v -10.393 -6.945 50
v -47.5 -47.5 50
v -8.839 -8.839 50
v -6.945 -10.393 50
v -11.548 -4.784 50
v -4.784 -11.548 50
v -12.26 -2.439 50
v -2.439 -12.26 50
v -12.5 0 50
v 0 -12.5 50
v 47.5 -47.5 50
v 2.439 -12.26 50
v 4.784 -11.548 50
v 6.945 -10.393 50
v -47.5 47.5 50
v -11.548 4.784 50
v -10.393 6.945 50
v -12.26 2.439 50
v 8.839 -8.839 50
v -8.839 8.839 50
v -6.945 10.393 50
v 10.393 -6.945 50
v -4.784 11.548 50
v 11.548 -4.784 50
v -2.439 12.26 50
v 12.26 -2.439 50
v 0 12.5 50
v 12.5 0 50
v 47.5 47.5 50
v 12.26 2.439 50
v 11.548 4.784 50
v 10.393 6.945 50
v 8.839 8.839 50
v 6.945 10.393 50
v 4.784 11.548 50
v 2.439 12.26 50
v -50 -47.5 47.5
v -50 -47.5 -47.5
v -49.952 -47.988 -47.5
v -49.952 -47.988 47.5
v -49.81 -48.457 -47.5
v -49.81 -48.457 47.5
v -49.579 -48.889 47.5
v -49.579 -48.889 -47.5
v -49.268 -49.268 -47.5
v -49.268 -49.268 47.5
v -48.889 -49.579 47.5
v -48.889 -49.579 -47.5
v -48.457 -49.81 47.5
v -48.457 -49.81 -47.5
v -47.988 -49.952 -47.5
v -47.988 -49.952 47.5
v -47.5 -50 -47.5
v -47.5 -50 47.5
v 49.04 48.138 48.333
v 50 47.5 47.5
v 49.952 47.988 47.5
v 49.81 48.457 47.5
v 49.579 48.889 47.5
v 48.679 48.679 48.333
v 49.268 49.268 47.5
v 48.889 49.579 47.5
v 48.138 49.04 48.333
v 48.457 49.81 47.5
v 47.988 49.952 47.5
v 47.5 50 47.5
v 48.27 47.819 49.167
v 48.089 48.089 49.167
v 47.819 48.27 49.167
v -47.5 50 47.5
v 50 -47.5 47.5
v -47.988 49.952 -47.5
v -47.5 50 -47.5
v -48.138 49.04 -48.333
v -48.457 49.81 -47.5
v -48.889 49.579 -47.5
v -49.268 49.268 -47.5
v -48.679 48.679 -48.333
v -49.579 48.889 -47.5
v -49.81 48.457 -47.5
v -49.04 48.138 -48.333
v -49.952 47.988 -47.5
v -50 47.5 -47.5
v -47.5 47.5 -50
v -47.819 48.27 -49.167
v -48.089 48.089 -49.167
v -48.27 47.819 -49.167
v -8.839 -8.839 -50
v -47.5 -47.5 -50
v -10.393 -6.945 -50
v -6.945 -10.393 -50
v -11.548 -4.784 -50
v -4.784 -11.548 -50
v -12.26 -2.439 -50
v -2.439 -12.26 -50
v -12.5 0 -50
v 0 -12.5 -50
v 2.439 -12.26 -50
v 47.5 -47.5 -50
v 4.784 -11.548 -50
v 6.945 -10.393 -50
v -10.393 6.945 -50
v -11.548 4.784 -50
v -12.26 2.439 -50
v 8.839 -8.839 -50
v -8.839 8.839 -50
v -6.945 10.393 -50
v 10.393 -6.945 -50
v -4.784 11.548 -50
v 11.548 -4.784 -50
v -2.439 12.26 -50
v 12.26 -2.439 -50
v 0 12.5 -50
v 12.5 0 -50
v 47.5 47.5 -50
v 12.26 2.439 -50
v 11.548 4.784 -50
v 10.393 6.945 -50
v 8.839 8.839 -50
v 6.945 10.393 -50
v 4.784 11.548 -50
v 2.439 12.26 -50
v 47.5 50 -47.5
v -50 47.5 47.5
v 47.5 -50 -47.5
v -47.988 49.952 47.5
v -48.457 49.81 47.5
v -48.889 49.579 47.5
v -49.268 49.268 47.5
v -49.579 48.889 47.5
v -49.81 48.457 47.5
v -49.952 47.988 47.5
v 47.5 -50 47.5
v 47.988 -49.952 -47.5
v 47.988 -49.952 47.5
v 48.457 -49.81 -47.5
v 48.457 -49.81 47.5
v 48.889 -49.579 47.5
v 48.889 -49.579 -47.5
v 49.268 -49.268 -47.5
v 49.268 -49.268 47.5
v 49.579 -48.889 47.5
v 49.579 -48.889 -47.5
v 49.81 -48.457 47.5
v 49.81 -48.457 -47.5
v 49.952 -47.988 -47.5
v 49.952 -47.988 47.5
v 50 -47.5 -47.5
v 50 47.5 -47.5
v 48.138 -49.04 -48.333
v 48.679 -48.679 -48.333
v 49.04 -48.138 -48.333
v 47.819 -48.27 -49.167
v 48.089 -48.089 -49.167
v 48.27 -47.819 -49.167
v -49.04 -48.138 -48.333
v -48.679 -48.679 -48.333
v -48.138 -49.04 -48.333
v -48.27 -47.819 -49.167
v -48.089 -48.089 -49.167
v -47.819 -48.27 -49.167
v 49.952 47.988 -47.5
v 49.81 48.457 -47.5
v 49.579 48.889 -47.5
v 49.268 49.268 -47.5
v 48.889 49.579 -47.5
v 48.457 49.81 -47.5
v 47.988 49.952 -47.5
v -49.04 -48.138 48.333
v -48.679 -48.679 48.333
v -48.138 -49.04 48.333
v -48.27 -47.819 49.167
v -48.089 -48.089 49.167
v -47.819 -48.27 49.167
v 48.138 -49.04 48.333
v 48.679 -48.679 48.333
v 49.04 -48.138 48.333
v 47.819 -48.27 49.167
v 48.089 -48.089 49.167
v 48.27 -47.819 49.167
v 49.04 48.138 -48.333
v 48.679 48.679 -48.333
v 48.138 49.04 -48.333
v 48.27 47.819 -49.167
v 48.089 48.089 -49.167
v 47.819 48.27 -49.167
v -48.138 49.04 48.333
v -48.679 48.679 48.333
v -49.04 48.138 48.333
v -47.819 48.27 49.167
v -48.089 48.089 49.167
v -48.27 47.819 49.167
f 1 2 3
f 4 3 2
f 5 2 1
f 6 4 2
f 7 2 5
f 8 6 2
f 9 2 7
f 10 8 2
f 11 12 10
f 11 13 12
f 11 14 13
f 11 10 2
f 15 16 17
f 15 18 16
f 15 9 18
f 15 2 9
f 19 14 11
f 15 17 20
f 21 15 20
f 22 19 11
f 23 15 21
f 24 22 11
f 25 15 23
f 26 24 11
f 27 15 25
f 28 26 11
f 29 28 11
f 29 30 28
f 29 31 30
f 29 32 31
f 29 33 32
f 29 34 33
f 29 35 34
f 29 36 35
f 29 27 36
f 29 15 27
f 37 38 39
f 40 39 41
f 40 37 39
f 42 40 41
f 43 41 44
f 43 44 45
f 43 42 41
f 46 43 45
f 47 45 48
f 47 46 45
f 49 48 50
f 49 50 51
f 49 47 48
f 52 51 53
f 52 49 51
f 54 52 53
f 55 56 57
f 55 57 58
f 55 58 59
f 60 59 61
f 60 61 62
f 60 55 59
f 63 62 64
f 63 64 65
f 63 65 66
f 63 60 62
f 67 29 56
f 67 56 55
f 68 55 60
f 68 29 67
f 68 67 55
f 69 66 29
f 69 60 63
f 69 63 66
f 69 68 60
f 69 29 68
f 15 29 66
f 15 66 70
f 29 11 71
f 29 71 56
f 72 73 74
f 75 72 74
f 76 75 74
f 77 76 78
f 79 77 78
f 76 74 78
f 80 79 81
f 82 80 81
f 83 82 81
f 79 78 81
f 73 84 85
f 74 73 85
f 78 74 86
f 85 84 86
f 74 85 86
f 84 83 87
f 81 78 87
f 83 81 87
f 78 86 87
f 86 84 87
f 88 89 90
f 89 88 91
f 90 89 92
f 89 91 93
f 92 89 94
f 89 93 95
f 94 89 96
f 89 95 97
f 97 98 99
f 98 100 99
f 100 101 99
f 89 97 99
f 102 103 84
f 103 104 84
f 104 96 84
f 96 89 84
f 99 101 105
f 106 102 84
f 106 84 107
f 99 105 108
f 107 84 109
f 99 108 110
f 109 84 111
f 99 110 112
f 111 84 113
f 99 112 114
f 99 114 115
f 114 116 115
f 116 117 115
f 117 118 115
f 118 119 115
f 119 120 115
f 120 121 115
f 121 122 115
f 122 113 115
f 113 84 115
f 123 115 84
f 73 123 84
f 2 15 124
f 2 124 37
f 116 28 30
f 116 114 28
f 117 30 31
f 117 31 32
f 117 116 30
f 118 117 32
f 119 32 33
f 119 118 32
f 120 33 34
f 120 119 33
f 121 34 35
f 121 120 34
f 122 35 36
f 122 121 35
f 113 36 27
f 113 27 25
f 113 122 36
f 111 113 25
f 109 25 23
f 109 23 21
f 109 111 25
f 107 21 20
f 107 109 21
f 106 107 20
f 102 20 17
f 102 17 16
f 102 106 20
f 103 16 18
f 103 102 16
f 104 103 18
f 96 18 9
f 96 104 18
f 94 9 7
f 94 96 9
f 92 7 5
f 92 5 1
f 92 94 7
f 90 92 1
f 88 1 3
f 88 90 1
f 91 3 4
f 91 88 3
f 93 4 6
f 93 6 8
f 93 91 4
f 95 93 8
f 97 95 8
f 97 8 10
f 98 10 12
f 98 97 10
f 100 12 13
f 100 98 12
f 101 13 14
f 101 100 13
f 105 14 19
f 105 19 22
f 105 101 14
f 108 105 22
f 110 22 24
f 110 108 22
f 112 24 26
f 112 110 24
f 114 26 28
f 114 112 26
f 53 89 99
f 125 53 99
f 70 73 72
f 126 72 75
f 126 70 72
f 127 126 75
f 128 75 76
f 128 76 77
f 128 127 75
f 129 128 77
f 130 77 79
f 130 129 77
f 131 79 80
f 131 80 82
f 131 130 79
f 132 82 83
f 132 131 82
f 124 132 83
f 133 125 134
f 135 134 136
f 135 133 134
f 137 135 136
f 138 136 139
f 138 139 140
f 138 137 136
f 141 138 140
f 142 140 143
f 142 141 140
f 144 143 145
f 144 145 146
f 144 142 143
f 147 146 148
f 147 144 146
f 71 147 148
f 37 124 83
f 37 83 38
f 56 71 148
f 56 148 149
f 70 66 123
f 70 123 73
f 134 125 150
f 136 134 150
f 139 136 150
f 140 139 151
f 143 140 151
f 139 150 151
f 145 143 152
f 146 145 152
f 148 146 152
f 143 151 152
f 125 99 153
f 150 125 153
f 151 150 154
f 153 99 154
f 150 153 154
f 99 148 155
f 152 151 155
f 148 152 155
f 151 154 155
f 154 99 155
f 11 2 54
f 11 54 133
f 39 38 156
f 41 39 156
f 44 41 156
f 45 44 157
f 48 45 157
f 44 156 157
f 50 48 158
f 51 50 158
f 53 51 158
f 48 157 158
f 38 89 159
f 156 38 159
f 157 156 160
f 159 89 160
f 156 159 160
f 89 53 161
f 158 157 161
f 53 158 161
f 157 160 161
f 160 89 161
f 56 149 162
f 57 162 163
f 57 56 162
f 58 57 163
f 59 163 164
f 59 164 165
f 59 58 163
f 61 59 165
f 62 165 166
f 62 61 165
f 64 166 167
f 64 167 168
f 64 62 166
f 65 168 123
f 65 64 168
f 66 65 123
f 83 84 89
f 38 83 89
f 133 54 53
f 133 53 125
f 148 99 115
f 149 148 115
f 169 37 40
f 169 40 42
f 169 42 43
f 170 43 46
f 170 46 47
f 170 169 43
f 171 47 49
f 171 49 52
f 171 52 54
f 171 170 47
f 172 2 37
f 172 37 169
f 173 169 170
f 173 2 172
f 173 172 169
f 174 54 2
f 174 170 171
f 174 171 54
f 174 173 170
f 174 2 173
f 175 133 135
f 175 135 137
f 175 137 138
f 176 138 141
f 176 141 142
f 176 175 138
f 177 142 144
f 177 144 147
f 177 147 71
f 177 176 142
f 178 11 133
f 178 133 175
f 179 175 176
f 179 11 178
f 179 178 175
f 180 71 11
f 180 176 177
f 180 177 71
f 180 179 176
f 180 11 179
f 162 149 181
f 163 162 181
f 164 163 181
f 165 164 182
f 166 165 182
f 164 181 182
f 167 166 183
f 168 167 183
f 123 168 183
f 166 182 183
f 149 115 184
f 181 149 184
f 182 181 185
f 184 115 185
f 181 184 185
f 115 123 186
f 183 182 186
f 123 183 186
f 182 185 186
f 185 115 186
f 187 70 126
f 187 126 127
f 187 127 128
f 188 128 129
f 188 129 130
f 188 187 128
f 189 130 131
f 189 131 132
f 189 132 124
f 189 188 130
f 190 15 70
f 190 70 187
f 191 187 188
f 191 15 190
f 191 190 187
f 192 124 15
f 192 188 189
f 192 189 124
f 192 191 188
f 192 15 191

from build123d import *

# Parameters (mm, degrees)
F0_R     = 12.5
F1_DEPTH = 50
F2_SIZE  = 2.49999


# Not quite as in the source:
# - a fillet or chamfer is up to 0.001 mm smaller than in the source, because OpenCascade refuses the exact size


with BuildPart() as f1:
    # F0 (on Top) → F1 (new body, symmetric)
    with BuildSketch(Plane.XY):
        with BuildLine():
            ThreePointArc((-50, -47.5), (-49.267766953, -49.267766953), (-47.5, -50))
            Line((-47.5, -50), (47.5, -50))
            ThreePointArc((47.5, -50), (49.267766953, -49.267766953), (50, -47.5))
            Line((50, -47.5), (50, 47.5))
            ThreePointArc((50, 47.5), (49.267766953, 49.267766953), (47.5, 50))
            Line((47.5, 50), (-47.5, 50))
            ThreePointArc((-47.5, 50), (-49.267766953, 49.267766953), (-50, 47.5))
            Line((-50, 47.5), (-50, -47.5))
        make_face()
        Circle(F0_R, mode=Mode.SUBTRACT)
    extrude(amount=F1_DEPTH, both=True)

    # F2 (size 2.5 in the source; OpenCascade refuses exactly that, so slightly less here)
    f2_edges = [f1.edges().sort_by_distance(p)[0] for p in [
        (50, 0, 50),
        (0, -50, 50),
        (-50, 0, 50),
        (0, 50, 50),
        (50, 0, -50),
        (0, 50, -50),
    ]]
    chamfer(f2_edges, length=F2_SIZE)


solid = f1.part
